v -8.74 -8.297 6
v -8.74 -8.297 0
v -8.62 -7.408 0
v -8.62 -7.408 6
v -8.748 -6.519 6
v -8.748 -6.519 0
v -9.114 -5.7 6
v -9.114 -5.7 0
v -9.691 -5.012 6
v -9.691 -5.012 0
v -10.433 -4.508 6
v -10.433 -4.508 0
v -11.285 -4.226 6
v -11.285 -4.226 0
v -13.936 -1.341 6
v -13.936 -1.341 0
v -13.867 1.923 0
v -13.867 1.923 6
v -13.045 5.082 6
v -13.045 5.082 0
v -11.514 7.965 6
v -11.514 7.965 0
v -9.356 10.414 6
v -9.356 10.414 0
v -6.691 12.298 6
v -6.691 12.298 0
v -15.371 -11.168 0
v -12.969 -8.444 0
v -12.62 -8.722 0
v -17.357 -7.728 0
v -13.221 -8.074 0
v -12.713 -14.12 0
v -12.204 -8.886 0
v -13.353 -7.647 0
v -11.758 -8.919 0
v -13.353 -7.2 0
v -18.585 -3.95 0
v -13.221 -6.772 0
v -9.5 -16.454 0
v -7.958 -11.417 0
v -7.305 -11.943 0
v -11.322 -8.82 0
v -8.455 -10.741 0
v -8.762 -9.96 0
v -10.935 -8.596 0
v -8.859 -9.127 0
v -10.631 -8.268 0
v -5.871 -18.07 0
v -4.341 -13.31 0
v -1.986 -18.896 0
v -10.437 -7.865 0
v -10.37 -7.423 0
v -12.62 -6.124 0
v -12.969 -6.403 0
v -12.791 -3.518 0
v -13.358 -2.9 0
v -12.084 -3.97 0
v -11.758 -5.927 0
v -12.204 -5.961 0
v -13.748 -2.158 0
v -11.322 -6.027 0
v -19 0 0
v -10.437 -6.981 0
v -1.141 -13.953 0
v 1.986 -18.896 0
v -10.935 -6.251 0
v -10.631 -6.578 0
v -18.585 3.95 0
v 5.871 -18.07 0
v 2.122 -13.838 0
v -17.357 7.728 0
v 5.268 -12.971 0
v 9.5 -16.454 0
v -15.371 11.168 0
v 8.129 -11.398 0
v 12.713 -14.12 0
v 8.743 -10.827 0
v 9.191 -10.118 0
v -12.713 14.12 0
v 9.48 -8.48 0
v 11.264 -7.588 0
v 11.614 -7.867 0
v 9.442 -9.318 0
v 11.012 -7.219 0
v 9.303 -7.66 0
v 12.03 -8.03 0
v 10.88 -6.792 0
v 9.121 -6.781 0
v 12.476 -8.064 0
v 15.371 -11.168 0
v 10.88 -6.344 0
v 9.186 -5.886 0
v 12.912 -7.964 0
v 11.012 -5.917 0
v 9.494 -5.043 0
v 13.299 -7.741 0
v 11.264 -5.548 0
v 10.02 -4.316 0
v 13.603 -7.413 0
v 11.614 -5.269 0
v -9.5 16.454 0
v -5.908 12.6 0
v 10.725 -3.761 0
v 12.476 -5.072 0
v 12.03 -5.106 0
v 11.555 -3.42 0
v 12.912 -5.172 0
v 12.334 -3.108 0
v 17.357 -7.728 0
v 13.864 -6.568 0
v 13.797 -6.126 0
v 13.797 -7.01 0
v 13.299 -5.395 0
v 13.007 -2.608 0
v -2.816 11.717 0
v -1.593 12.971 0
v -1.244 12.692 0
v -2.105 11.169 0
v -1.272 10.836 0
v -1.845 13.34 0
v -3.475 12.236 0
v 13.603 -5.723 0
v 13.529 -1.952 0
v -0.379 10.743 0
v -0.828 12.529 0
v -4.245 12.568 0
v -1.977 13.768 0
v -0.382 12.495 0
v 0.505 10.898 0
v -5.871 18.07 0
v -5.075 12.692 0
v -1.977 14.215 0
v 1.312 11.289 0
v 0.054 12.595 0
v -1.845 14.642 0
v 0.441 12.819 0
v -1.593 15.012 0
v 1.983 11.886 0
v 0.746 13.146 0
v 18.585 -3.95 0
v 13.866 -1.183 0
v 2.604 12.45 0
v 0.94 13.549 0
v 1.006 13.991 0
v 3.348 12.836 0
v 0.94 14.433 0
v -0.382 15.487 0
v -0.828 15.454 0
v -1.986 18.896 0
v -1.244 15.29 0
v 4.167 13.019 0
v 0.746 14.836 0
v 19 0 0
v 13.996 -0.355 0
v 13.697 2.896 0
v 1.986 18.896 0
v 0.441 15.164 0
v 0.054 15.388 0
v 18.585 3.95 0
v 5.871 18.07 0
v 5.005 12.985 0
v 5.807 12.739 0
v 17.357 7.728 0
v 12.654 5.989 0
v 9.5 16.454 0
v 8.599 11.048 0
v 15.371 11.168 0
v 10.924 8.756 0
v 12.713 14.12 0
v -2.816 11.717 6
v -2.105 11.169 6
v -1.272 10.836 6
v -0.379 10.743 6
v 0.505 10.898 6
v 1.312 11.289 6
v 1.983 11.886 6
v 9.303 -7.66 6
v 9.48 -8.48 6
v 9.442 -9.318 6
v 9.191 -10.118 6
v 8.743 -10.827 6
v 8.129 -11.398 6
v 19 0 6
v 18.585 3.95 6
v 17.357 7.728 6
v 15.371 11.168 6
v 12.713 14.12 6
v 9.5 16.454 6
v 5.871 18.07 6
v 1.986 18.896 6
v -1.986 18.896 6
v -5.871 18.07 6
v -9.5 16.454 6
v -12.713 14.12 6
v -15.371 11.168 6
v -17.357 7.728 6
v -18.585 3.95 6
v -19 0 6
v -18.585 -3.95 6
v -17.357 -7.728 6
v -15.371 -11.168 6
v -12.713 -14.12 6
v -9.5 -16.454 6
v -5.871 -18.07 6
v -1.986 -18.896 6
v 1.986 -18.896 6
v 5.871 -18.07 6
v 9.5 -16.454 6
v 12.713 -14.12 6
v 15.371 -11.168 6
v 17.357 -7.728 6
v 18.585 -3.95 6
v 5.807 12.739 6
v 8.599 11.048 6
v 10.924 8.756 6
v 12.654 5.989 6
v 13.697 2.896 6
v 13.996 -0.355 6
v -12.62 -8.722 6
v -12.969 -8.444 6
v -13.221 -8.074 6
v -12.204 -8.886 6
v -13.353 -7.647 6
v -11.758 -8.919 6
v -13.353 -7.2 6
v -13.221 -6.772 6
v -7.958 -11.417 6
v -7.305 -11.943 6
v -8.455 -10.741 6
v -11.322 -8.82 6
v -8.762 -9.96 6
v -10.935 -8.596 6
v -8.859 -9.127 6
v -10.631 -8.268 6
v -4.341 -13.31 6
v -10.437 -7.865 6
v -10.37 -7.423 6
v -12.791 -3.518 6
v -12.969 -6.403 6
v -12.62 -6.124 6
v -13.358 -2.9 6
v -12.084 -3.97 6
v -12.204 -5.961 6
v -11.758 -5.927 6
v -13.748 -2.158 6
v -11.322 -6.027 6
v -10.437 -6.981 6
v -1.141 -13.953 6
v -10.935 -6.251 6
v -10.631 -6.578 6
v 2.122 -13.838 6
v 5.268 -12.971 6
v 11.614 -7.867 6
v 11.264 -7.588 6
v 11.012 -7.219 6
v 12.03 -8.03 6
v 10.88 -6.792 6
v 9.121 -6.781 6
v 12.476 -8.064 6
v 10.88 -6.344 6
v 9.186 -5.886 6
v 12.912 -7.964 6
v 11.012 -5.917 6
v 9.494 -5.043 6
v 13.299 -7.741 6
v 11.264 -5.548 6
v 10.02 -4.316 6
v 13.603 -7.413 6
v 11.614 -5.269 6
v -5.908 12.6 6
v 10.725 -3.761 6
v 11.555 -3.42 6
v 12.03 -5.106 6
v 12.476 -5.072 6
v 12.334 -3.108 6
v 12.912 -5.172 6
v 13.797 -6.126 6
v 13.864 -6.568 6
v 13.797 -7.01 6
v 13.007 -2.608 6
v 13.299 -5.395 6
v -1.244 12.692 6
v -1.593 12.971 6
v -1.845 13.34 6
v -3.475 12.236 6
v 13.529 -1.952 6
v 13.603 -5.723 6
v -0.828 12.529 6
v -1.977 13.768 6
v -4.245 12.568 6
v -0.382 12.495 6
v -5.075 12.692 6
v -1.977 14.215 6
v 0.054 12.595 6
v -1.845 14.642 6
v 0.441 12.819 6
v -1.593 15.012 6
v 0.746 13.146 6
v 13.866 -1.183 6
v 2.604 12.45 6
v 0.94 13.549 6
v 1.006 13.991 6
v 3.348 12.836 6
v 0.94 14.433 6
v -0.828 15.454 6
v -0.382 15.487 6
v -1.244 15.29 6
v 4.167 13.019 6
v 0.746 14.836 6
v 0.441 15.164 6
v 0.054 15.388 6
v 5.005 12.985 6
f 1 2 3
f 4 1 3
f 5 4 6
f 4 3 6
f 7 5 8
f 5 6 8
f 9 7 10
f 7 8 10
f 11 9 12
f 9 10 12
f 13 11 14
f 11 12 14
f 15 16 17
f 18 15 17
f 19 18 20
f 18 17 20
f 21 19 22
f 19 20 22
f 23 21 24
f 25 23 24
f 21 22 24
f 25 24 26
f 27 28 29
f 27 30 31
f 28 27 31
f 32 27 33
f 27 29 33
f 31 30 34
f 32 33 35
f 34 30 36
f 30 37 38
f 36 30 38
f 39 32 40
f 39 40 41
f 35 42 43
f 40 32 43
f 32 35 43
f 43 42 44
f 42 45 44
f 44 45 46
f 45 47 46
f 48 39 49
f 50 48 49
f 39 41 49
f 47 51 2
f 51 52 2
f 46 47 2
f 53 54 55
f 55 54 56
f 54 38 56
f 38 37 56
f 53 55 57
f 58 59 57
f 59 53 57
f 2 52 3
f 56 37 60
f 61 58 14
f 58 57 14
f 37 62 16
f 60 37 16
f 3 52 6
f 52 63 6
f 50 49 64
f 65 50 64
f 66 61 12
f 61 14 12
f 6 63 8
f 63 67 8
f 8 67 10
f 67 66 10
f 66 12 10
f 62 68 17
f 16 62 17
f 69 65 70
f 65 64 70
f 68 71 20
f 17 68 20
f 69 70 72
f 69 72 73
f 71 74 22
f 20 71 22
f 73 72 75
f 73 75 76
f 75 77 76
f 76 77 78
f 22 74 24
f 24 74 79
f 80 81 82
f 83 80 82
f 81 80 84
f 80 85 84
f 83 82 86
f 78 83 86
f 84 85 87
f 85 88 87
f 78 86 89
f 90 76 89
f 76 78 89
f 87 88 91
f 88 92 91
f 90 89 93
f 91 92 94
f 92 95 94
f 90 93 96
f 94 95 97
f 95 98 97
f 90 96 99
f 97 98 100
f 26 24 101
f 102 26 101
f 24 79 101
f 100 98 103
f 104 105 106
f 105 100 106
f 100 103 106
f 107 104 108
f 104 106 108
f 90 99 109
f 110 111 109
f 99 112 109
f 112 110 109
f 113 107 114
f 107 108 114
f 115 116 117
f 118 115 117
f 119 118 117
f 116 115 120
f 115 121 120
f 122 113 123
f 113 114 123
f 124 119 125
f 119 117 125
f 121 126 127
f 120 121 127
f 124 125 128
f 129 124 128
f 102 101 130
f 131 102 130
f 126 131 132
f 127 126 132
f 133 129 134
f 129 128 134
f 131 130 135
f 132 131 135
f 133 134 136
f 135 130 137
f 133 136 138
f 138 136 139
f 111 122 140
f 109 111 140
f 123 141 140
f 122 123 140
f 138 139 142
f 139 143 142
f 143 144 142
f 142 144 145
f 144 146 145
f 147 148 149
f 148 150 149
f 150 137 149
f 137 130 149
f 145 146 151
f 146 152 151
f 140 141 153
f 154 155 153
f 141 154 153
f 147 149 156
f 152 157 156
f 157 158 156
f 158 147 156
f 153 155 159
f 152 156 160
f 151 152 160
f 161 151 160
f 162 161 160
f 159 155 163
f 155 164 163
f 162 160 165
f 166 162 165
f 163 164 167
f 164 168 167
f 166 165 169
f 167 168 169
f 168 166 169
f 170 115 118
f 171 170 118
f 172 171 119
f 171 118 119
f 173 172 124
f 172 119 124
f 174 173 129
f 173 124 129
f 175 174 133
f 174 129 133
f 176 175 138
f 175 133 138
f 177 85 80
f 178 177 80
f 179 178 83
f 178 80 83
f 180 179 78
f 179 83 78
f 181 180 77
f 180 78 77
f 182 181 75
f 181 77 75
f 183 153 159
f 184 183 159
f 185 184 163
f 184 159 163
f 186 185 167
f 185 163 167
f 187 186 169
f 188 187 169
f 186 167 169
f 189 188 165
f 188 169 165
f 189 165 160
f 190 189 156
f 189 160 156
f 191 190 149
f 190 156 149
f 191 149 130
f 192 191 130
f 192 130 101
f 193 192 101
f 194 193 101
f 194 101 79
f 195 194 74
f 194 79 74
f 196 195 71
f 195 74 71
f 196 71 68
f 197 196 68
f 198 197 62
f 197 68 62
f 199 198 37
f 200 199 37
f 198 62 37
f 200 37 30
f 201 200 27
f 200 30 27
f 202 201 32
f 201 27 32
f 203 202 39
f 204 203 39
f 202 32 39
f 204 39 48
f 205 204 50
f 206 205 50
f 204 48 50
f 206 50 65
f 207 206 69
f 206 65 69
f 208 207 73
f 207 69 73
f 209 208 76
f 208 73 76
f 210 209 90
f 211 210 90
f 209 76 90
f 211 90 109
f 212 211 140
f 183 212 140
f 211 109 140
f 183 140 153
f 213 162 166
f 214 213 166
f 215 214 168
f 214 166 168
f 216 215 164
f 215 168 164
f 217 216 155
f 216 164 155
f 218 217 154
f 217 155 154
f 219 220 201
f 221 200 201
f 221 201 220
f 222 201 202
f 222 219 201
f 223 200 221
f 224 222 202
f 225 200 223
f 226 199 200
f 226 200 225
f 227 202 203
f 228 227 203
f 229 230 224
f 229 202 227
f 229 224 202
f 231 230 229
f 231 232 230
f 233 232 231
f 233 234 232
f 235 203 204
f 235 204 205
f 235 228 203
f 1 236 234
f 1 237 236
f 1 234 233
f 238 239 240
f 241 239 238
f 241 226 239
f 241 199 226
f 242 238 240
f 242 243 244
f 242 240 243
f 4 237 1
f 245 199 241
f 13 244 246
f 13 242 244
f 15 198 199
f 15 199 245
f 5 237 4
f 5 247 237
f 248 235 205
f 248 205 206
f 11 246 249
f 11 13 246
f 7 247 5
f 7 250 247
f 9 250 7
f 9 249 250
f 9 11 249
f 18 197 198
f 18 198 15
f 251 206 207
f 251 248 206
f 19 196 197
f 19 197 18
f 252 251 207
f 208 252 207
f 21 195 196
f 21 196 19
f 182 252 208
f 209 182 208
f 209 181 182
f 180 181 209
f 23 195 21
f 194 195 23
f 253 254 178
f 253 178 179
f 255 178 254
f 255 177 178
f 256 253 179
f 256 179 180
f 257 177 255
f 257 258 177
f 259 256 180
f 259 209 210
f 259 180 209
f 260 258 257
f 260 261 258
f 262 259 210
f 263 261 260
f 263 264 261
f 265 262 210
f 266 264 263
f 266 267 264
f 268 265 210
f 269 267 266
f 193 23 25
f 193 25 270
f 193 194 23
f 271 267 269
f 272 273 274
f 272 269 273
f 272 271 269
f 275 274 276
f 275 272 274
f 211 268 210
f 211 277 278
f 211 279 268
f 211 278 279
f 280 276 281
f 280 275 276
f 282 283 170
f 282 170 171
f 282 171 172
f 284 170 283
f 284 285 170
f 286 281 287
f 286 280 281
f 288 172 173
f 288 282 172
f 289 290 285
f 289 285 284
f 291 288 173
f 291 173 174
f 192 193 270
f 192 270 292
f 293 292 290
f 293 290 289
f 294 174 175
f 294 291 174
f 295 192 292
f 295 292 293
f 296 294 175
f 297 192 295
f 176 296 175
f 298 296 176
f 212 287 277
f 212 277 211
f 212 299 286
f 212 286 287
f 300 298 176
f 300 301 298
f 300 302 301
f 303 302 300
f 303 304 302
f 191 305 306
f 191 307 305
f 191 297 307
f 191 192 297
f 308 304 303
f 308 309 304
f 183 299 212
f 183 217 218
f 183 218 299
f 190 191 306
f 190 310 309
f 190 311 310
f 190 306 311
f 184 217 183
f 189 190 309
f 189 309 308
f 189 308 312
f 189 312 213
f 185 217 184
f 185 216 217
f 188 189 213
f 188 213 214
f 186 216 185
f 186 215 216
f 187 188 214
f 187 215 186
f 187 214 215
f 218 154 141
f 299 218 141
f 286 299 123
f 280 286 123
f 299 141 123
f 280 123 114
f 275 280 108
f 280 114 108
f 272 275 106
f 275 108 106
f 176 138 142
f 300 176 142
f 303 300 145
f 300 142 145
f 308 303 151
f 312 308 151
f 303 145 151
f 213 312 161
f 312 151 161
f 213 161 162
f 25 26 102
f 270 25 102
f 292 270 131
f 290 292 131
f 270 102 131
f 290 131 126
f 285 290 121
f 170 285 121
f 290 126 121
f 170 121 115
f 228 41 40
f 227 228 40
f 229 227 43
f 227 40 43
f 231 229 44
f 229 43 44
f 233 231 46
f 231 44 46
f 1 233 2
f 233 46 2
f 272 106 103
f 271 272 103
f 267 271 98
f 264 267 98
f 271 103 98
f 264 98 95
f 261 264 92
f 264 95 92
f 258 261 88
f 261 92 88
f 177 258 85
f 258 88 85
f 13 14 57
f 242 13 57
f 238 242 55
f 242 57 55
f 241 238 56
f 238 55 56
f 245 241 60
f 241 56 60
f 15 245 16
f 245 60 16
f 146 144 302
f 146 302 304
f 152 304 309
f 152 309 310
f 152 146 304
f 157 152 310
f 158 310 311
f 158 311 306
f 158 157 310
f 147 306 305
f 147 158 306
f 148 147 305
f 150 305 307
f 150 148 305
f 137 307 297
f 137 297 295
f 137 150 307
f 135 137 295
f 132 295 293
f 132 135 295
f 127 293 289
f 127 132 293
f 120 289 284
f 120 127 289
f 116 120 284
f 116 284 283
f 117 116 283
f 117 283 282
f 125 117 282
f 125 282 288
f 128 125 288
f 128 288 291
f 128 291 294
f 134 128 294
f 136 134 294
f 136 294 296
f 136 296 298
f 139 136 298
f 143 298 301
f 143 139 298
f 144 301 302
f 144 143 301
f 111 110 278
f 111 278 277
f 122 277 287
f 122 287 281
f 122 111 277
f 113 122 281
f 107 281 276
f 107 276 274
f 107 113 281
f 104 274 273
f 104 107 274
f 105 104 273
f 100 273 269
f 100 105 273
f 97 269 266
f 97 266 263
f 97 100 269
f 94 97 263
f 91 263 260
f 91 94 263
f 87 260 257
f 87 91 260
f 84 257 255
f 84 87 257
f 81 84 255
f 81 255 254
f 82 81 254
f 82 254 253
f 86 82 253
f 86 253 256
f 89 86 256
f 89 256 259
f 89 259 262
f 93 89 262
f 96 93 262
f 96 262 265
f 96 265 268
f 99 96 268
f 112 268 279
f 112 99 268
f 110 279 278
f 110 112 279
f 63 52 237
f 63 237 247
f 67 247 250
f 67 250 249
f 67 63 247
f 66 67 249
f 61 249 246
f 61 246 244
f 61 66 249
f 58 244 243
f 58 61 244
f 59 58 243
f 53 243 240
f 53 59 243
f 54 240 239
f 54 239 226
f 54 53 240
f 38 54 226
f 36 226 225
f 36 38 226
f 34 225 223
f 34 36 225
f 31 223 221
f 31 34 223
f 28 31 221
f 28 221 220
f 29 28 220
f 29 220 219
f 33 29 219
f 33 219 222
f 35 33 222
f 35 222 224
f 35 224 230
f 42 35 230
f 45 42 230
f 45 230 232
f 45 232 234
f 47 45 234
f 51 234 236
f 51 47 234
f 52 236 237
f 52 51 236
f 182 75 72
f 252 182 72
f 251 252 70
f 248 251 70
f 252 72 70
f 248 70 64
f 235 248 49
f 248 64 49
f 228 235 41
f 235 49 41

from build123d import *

# Parameters (mm, degrees)
ESQUISSE1_R        = 19
ESQUISSE1_R_2      = 1.5
BOSS_EXTRU_2_DEPTH = 6


with BuildPart() as part:
    # Esquisse1 → Boss.-Extru.2 (new body)
    with BuildSketch(Plane.XY):
        Circle(ESQUISSE1_R)
        with Locations((-0.493805045, 13.991288596)):
            Circle(ESQUISSE1_R_2, mode=Mode.SUBTRACT)
        with Locations((12.363713879, -6.567996584)):
            Circle(ESQUISSE1_R_2, mode=Mode.SUBTRACT)
        with Locations((-11.869908833, -7.423292012)):
            Circle(ESQUISSE1_R_2, mode=Mode.SUBTRACT)
        with BuildLine():
            ThreePointArc((-2.815595301, 11.717131607), (-0.379171731, 10.743310886), (1.982535482, 11.886475637))
            ThreePointArc((1.982535482, 11.886475637), (3.751818189, 12.953817976), (5.806908291, 12.738909534))
            ThreePointArc((5.806908291, 12.738909534), (11.869908833, 7.423292012), (13.995505264, -0.354728625))
            ThreePointArc((13.995505264, -0.354728625), (13.289218046, -2.296567787), (11.555131282, -3.420188746))
            ThreePointArc((11.555131282, -3.420188746), (9.493566014, -5.043283091), (9.302722122, -7.66016391))
            ThreePointArc((9.302722122, -7.66016391), (9.342426349, -9.72607885), (8.128765127, -11.398384864))
            ThreePointArc((8.128765127, -11.398384864), (0.493805045, -13.991288596), (-7.304956633, -11.943098785))
            ThreePointArc((-7.304956633, -11.943098785), (-8.633495068, -10.360516531), (-8.739535981, -8.296942861))
            ThreePointArc((-8.739535981, -8.296942861), (-9.114394283, -5.700027795), (-11.285257604, -4.226311727))
            ThreePointArc((-11.285257604, -4.226311727), (-13.094244538, -3.227739126), (-13.935673418, -1.34052467))
            ThreePointArc((-13.935673418, -1.34052467), (-12.363713879, 6.567996584), (-6.690548632, 12.29782741))
            ThreePointArc((-6.690548632, 12.29782741), (-4.655722978, 12.657084318), (-2.815595301, 11.717131607))
        make_face(mode=Mode.SUBTRACT)
    extrude(amount=BOSS_EXTRU_2_DEPTH)


solid = part.part
